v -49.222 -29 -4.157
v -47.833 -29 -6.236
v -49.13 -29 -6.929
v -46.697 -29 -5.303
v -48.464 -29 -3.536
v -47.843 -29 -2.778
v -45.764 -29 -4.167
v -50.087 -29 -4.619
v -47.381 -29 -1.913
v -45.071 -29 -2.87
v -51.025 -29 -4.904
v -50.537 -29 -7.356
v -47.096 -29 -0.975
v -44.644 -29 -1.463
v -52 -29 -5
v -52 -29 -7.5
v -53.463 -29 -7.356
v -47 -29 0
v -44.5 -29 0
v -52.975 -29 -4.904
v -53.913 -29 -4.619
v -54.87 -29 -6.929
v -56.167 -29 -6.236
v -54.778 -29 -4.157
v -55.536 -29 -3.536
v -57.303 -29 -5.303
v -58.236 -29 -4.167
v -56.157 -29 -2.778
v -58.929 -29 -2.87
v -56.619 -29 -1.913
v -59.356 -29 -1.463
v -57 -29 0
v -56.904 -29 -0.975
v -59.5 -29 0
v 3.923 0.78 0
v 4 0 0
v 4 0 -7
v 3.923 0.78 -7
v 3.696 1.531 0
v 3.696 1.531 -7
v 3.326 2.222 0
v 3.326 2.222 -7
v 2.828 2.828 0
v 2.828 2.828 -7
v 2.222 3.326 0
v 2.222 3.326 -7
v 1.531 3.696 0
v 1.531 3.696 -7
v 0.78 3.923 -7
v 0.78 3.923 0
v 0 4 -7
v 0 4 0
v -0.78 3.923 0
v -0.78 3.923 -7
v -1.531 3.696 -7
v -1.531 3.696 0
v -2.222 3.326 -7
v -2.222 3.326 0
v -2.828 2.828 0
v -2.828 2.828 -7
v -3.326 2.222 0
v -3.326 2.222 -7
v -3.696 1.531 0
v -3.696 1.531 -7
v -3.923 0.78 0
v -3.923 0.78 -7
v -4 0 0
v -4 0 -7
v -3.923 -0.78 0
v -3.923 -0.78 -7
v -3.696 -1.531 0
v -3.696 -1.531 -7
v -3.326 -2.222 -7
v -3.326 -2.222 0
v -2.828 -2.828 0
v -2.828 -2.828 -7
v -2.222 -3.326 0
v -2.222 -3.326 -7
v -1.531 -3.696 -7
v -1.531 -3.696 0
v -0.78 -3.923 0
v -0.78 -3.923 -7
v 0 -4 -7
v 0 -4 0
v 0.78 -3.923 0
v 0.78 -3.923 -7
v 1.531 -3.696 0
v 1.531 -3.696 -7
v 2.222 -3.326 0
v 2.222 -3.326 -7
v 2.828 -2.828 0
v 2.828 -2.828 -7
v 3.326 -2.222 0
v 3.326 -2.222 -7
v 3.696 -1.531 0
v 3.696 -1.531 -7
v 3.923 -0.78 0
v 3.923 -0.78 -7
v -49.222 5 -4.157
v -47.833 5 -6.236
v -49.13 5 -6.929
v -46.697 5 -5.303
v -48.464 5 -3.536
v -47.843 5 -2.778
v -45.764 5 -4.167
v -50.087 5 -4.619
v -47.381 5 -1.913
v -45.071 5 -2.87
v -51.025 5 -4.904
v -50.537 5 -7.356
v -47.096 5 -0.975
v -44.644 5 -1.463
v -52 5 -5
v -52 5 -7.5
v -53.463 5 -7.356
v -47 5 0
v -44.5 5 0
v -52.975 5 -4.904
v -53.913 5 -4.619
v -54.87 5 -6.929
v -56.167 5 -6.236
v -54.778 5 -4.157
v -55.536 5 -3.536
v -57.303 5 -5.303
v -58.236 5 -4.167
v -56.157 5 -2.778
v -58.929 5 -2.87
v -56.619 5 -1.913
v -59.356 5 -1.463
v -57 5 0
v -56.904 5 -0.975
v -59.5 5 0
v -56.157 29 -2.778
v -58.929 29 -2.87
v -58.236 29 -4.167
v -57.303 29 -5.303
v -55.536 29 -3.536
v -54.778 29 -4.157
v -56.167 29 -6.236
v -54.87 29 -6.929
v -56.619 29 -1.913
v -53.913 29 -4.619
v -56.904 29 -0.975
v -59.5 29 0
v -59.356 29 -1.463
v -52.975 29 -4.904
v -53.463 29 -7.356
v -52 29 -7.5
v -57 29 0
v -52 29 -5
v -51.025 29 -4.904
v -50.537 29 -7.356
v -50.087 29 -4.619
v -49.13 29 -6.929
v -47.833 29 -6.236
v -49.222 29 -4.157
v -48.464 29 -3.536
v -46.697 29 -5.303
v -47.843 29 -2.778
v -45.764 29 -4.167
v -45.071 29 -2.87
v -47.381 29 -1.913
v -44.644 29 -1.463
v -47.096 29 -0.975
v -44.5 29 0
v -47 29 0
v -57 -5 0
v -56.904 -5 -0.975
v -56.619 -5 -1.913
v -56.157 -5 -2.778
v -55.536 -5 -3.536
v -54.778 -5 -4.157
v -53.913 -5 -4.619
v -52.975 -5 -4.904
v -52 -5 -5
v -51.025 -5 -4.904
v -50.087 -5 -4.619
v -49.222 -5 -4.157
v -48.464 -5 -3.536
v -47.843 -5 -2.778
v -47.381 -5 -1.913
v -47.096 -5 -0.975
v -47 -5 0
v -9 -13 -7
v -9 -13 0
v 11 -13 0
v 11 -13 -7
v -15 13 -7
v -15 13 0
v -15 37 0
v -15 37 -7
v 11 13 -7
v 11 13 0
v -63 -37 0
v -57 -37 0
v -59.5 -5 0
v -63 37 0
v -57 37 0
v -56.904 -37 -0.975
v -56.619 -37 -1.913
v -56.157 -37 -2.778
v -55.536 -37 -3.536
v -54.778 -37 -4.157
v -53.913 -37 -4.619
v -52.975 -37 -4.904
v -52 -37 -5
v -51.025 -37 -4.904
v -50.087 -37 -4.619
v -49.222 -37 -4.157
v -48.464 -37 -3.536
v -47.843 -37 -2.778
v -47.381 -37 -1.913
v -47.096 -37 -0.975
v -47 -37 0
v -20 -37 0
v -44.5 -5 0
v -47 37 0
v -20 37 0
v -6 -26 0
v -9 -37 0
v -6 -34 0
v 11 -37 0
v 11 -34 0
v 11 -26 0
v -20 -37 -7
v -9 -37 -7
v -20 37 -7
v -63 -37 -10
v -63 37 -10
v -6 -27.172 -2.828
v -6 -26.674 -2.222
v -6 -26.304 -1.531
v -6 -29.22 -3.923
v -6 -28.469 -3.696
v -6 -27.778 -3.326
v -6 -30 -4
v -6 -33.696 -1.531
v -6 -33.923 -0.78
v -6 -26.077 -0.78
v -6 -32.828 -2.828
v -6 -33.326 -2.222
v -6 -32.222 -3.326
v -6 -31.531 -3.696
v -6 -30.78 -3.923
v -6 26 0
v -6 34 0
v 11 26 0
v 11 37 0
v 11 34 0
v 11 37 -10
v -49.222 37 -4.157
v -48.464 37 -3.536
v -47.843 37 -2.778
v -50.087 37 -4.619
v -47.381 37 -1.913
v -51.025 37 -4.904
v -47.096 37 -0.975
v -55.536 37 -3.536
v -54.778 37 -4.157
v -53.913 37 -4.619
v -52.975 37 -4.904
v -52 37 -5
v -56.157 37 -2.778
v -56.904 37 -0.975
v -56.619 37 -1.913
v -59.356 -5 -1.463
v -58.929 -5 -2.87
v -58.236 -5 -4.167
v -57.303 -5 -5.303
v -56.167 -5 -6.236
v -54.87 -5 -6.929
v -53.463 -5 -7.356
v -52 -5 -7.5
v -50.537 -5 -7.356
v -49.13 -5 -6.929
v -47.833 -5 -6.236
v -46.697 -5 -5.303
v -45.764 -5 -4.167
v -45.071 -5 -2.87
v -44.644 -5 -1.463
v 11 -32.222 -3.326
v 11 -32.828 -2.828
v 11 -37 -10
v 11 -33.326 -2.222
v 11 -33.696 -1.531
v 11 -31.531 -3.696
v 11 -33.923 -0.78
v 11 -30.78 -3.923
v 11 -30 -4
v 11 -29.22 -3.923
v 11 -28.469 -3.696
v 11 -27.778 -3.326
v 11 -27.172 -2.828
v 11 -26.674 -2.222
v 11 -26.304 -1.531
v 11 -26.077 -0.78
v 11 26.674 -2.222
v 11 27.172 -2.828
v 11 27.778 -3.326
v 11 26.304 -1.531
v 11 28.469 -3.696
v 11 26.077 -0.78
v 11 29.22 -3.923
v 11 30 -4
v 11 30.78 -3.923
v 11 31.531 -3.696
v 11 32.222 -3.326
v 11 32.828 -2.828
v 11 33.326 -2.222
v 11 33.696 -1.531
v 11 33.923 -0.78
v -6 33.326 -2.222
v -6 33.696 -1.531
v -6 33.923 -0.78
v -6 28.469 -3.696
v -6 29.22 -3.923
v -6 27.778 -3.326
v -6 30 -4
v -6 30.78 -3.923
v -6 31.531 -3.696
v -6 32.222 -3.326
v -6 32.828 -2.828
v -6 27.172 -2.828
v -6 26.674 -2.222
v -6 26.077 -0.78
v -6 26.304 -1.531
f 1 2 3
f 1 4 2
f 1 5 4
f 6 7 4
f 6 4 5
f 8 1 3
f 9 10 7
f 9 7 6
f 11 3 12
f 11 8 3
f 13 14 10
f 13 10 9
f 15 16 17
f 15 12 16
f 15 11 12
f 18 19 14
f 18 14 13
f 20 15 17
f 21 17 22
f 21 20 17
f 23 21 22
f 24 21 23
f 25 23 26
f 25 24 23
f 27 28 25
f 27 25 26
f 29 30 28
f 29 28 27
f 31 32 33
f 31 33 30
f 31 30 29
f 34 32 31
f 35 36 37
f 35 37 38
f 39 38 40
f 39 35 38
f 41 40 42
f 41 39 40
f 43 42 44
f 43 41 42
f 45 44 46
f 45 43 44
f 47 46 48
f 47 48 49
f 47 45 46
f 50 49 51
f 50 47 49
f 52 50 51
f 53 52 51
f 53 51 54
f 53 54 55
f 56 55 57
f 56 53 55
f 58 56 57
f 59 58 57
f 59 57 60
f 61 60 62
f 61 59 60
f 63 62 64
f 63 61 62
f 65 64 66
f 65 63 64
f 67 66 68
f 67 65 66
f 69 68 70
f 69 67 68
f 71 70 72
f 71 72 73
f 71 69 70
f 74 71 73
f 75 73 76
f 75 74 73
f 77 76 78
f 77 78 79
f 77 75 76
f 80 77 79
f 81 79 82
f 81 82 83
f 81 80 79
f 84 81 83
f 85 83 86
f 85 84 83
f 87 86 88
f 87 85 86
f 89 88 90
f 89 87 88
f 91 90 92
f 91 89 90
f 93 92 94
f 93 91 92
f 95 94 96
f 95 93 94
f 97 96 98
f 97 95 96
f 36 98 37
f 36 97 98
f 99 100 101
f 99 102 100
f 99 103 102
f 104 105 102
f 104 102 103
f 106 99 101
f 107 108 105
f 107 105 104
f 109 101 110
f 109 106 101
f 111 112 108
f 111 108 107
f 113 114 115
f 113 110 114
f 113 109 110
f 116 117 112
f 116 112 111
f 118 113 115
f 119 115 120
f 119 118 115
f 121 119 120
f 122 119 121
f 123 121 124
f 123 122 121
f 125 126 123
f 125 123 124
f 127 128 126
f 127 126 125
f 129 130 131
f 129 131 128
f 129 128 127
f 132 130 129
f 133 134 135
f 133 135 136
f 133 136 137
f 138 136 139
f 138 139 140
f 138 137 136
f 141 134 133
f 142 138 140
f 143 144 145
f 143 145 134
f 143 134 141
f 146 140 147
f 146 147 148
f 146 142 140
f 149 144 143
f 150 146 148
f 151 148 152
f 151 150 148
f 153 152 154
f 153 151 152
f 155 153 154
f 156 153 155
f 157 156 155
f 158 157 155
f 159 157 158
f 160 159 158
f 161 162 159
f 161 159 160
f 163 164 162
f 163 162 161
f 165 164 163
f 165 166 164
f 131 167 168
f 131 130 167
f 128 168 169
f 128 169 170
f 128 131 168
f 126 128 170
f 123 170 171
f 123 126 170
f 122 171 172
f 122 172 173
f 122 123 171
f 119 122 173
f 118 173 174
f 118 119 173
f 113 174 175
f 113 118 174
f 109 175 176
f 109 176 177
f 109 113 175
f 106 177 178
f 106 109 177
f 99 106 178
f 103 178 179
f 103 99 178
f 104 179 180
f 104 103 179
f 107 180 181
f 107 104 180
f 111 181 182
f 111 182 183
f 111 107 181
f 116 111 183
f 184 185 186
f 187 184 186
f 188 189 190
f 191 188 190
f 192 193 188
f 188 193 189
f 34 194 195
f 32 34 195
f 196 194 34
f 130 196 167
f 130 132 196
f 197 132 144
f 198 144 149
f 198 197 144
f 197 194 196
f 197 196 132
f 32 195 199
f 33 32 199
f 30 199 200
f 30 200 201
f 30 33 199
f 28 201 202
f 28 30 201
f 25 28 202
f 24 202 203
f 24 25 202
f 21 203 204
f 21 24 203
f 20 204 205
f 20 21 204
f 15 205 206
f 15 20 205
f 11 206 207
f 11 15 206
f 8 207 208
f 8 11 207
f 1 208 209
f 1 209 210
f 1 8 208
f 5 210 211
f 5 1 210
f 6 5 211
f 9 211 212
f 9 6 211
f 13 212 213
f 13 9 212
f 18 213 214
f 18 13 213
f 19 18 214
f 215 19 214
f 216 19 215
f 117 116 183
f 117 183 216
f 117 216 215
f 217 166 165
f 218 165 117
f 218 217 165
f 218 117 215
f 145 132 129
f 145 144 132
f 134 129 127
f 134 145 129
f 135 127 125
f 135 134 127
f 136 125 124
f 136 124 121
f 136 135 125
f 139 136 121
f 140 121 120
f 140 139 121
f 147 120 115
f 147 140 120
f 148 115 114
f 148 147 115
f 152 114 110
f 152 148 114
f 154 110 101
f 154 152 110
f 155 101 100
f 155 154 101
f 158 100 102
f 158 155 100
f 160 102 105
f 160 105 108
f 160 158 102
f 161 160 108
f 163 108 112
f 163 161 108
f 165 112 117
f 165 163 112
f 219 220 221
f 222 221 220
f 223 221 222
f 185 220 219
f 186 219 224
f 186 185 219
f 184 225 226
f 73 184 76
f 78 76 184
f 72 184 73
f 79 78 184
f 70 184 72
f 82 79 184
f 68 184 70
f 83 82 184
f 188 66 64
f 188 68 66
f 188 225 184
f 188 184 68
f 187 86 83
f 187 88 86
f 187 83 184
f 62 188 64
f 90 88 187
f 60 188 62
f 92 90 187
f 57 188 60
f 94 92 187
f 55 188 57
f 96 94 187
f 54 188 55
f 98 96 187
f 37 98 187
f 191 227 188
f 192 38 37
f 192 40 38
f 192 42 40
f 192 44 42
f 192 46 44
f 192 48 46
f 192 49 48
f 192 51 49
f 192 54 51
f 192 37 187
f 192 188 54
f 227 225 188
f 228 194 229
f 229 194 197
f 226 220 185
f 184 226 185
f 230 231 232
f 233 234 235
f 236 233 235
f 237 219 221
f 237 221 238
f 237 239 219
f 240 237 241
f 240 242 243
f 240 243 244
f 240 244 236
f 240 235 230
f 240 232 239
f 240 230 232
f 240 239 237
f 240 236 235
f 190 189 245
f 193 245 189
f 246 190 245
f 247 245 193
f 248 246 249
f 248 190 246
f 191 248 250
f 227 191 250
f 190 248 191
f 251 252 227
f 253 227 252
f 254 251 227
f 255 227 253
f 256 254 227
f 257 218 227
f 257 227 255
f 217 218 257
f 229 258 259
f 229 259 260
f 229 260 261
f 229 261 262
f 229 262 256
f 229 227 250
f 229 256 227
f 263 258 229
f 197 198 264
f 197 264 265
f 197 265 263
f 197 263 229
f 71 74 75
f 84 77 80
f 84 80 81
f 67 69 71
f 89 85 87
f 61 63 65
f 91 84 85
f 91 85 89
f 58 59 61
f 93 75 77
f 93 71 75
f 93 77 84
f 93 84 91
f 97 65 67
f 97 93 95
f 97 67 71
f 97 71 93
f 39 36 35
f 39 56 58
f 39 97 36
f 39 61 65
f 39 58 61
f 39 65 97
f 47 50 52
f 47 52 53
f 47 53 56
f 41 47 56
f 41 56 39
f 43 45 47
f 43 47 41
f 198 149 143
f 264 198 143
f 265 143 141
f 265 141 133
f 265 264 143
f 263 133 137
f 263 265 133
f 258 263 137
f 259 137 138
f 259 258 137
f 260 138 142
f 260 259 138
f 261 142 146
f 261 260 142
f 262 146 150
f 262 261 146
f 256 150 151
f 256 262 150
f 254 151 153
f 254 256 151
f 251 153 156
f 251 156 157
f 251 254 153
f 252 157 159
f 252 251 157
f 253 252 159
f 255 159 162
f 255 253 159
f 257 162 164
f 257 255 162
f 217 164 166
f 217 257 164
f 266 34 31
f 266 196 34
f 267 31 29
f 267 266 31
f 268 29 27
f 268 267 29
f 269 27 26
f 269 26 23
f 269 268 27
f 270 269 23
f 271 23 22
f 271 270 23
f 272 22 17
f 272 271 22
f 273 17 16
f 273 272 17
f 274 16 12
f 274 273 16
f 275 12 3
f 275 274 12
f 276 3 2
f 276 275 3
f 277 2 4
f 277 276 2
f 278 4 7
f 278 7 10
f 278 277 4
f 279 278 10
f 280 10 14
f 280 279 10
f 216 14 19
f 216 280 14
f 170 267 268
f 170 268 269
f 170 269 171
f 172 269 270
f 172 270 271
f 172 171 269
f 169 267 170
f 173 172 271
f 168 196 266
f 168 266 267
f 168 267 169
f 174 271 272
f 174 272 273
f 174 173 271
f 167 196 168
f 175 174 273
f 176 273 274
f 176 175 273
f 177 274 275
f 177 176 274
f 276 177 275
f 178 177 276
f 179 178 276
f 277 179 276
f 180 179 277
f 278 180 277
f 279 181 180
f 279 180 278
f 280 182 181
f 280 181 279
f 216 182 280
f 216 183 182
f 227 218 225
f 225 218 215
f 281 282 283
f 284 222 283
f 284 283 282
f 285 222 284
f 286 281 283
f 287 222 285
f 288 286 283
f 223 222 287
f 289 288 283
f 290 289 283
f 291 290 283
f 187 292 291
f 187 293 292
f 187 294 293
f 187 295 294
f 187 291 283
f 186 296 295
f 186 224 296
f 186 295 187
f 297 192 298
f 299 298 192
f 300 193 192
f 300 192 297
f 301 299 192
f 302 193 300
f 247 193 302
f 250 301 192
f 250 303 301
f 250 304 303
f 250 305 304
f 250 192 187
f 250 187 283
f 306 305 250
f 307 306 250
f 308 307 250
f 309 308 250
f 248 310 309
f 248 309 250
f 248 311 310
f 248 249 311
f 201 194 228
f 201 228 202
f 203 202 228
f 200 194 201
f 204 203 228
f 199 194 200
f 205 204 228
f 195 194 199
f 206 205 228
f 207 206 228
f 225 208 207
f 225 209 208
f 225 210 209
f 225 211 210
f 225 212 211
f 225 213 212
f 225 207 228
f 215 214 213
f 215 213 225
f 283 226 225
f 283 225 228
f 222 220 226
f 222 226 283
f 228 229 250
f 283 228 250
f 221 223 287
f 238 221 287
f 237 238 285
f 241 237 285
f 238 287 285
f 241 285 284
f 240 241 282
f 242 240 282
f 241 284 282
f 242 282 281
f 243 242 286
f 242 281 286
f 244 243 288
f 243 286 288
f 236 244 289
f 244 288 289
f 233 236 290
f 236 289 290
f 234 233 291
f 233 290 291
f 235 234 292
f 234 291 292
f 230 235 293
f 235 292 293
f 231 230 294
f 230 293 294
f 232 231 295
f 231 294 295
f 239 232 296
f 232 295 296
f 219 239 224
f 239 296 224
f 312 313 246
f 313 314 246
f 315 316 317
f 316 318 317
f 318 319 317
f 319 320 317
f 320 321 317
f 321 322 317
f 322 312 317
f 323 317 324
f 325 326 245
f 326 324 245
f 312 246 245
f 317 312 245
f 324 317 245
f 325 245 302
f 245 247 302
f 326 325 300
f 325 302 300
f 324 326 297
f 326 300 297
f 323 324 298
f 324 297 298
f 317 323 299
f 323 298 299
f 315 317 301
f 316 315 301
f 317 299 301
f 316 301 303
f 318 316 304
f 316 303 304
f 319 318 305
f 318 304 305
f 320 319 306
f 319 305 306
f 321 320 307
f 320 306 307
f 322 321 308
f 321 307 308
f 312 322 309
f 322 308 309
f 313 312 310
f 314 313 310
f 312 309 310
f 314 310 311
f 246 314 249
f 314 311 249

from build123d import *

# Parameters (mm, degrees)
F0_R     = 4
F0_W     = 11
F0_H     = 74
F0_W_2   = 17
F0_H_2   = 4
F1_DEPTH = 10
F5_DEPTH = 7


with BuildPart() as f1:
    # F0 (on Top) → F1 (new body)
    with BuildSketch(Plane.XY):
        Polygon((-47, -37), (-20, -37), (-20, 13), (-20, 37), (-47, 37), (-47, 29), (-44.5, 29), (-44.5, 5), (-47, 5), (-47, 0), (-47, -5), (-44.5, -5), (-44.5, -29), (-47, -29), align=None)
        Polygon((-9, -37), (-9, -13), (11, -13), (11, 13), (-15, 13), (-15, 37), (-20, 37), (-20, 13), (-20, -37), align=None)
        Circle(F0_R, mode=Mode.SUBTRACT)
        with Locations((-57.5, 0)):
            Rectangle(F0_W, F0_H)
        Polygon((-15, 13), (11, 13), (11, 30), (-6, 30), (-6, 34), (11, 34), (11, 37), (-15, 37), align=None)
        Polygon((-52, -37), (-47, -37), (-47, -29), (-44.5, -29), (-44.5, -5), (-47, -5), (-47, 0), (-47, 5), (-44.5, 5), (-44.5, 29), (-47, 29), (-47, 37), (-52, 37), align=None)
        Polygon((11, -13), (-9, -13), (-9, -37), (11, -37), (11, -34), (-6, -34), (-6, -30), (11, -30), align=None)
        with Locations((2.5, 32)):
            Rectangle(F0_W_2, F0_H_2)
        with Locations((2.5, -32)):
            Rectangle(F0_W_2, F0_H_2)
        Circle(F0_R)
    extrude(amount=-F1_DEPTH)

    # F0 (on Top) → F2 (revolve, cut)
    with BuildSketch(Plane.XY):
        Polygon((-52, -37), (-47, -37), (-47, -29), (-44.5, -29), (-44.5, -5), (-47, -5), (-47, 0), (-47, 5), (-44.5, 5), (-44.5, 29), (-47, 29), (-47, 37), (-52, 37), align=None)
    revolve(axis=Axis((-52, 0, 0), (0, -1, 0)), mode=Mode.SUBTRACT)

    # F0 (on Top) → F3 (revolve, cut)
    with BuildSketch(Plane.XY):
        with Locations((2.5, 32)):
            Rectangle(F0_W_2, F0_H_2)
    revolve(axis=Axis((2.5, 30, 0), (1, 0, 0)), mode=Mode.SUBTRACT)

    # F0 (on Top) → F4 (revolve, cut)
    with BuildSketch(Plane.XY):
        with Locations((2.5, -32)):
            Rectangle(F0_W_2, F0_H_2)
    revolve(axis=Axis((2.5, -30, 0), (1, 0, 0)), mode=Mode.SUBTRACT)

    # F0 (on Top) → F5 (cut)
    with BuildSketch(Plane.XY):
        Polygon((-9, -37), (-9, -13), (11, -13), (11, 13), (-15, 13), (-15, 37), (-20, 37), (-20, 13), (-20, -37), align=None)
        Circle(F0_R, mode=Mode.SUBTRACT)
    extrude(amount=-F5_DEPTH, mode=Mode.SUBTRACT)


solid = f1.part
